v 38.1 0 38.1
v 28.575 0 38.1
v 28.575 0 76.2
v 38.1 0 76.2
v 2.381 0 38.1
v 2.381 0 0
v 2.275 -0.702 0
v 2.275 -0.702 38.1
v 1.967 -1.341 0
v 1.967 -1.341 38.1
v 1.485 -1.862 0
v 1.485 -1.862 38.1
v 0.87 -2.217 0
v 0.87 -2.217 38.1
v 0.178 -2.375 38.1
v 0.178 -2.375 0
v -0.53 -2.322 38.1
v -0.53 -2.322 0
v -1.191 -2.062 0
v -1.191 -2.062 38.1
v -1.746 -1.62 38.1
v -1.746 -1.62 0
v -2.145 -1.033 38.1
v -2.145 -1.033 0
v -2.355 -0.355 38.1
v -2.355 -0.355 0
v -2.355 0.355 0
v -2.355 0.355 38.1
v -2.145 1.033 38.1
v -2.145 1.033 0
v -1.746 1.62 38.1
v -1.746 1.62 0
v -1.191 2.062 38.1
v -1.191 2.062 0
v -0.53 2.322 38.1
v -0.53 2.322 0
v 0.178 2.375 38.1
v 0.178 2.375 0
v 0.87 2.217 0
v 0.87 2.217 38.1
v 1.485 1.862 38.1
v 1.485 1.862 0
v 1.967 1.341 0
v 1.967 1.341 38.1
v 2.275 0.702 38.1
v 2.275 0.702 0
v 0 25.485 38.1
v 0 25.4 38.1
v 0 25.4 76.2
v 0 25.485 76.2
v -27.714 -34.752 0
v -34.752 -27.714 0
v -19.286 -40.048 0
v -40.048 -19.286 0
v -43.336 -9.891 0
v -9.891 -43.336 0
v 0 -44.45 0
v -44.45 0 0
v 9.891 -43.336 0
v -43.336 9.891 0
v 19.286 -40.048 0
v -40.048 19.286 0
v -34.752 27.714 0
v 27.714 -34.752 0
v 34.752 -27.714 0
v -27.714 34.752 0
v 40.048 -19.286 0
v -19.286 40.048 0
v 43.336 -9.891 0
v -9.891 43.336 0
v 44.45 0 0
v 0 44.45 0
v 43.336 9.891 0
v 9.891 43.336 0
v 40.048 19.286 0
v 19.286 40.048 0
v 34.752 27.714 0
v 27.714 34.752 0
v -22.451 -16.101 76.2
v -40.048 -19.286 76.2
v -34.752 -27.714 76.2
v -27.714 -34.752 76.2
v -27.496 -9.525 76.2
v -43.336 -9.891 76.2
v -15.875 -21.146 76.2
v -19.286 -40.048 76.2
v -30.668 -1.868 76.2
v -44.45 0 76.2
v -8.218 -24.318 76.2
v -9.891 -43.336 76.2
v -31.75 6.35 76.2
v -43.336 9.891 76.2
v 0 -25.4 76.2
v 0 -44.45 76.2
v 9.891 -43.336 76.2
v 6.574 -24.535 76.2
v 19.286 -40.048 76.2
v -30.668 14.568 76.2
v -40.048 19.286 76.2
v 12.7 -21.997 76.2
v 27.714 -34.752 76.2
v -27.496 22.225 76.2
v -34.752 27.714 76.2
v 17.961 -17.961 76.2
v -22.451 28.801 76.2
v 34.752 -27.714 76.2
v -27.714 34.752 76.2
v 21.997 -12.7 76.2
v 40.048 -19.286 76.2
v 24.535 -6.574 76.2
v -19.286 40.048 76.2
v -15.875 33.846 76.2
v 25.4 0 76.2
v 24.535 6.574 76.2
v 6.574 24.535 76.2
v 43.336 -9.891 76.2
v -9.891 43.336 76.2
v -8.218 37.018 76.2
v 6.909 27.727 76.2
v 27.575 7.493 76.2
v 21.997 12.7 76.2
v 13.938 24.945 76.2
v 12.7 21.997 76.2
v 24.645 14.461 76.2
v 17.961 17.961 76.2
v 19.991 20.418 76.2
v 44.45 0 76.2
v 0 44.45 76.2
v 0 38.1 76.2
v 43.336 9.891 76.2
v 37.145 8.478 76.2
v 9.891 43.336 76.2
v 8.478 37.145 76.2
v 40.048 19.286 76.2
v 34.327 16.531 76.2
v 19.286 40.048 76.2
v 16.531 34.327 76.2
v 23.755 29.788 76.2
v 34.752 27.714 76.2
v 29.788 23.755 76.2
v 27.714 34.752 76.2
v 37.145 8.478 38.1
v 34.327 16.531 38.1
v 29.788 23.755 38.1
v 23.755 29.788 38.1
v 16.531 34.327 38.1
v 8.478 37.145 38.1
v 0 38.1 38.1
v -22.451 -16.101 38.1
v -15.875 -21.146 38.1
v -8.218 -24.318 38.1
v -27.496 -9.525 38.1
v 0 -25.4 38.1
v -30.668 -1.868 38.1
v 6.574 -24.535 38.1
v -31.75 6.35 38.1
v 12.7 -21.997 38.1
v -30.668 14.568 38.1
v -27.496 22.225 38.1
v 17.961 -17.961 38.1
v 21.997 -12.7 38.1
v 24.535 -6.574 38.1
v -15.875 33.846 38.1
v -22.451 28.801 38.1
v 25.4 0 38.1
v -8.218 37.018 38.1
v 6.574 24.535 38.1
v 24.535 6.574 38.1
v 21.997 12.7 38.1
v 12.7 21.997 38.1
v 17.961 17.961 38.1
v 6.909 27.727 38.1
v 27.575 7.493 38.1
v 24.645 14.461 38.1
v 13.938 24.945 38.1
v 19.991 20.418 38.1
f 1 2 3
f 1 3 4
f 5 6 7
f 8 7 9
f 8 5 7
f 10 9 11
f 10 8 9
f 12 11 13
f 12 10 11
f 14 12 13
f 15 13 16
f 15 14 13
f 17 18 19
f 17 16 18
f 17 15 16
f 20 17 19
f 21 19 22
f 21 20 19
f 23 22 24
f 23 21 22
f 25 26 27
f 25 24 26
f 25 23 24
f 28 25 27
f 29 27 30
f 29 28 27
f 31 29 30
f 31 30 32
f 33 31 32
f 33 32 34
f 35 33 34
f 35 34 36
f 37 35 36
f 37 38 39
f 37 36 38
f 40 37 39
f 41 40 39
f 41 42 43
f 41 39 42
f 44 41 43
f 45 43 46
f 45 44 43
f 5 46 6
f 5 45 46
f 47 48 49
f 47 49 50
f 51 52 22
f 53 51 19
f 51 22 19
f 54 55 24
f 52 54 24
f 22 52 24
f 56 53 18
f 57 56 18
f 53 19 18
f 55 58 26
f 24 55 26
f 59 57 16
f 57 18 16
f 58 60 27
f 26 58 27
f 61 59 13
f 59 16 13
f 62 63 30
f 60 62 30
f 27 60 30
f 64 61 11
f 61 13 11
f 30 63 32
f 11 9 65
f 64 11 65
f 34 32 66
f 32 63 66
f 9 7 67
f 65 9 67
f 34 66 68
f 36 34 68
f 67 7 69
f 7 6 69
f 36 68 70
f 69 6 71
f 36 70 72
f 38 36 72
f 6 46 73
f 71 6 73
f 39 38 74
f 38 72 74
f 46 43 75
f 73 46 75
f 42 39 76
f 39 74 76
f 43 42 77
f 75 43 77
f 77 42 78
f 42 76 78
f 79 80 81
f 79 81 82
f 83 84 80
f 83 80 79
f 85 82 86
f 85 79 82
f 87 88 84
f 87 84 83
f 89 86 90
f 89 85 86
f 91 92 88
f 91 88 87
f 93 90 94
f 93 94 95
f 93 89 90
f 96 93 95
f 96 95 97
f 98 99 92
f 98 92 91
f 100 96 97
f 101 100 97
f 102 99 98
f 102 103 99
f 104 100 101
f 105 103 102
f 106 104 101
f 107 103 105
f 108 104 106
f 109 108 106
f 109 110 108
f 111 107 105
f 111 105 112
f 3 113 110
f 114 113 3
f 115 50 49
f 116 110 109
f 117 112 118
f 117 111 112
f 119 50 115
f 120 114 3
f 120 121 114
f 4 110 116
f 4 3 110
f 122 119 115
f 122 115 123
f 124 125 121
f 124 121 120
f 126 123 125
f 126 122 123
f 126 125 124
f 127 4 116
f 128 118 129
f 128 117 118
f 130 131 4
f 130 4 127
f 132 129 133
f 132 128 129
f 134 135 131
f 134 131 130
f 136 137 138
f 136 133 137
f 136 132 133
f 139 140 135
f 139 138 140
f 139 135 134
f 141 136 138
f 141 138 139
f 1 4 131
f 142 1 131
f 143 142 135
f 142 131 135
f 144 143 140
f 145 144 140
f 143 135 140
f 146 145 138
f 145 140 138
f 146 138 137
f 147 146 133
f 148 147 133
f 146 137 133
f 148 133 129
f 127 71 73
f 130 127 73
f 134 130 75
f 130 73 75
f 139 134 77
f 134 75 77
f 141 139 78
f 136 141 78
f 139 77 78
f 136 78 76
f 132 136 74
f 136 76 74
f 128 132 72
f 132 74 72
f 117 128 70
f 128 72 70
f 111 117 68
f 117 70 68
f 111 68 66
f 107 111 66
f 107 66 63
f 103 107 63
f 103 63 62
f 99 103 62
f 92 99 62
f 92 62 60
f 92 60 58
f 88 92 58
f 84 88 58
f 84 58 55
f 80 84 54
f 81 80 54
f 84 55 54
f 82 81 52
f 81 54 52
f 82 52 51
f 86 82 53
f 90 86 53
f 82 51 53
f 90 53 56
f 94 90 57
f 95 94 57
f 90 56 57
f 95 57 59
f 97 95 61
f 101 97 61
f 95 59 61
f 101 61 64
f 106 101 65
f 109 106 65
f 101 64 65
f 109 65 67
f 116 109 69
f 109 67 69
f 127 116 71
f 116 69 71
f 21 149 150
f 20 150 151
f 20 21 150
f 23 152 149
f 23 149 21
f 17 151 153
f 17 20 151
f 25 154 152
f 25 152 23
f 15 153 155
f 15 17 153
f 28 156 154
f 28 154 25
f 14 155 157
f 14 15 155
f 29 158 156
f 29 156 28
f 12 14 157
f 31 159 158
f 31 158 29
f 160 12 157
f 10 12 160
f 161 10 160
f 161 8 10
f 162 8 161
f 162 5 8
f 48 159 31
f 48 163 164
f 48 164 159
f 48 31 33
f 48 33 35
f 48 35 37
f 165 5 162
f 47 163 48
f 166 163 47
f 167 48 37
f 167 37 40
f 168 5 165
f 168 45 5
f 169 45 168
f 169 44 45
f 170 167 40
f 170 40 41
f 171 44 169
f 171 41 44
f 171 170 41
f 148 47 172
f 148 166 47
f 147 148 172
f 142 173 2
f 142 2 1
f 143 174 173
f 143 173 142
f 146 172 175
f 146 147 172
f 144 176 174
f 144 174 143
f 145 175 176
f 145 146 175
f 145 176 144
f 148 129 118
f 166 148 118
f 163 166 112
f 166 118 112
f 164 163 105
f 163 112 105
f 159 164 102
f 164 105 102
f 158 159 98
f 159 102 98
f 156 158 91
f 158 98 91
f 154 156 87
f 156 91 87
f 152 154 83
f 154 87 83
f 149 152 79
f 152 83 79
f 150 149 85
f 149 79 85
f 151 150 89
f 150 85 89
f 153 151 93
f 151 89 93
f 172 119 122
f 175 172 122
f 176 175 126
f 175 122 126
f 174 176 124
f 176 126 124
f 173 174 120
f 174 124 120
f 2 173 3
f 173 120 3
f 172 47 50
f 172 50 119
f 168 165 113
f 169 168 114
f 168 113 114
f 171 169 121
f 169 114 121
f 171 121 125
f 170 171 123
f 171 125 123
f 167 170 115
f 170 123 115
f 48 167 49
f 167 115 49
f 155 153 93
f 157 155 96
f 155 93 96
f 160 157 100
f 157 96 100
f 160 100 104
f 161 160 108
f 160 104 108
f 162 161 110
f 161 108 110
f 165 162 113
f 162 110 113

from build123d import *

# Parameters (mm, degrees)
F0_R        = 44.45
F1_DEPTH    = 76.2
F3_DEPTH    = 38.1
F4_T1_DEPTH = 56.0791508125
F5_DEPTH    = 76.201


# Not quite as in the source:
# - a fillet or chamfer that OpenCascade refuses, or shapes differently, is made with other operations: its cross-section is extruded or revolved along the edge and cut away or added


with BuildPart() as f1:
    # F0 (on Top) → F1 (new body)
    with BuildSketch(Plane.XY):
        Circle(F0_R)
    extrude(amount=F1_DEPTH)

    # F2 (on face) → F3 (cut)
    with BuildSketch(Plane.XY.offset(76.2)):
        with BuildLine():
            Line((0, 28.575), (0, 38.1))
            ThreePointArc((0, 38.1), (-28.175329967, 20.986026826), (-25.976370723, -11.90625))
            ThreePointArc((-25.976370723, -11.90625), (-24.0494461345, 15.4322637881), (0, 28.575))
        make_face()
        with BuildLine():
            ThreePointArc((0, 28.575), (-24.0494461345, 15.4322637881), (-25.976370723, -11.90625))
            ThreePointArc((-25.976370723, -11.90625), (-14.636026826, -21.825329967), (0, -25.4))
            ThreePointArc((0, -25.4), (-25.4, 0), (0, 25.4))
            Line((0, 25.4), (0, 28.575))
        make_face()
        with BuildLine():
            ThreePointArc((0, 25.4), (-25.4, 0), (0, -25.4))
            Line((0, -25.4), (0, -2.38125))
            ThreePointArc((0, -2.38125), (-2.38125, 0), (0, 2.38125))
            Line((0, 2.38125), (0, 25.4))
        make_face()
        with BuildLine():
            Line((0, -2.38125), (0, -25.4))
            ThreePointArc((0, -25.4), (17.9605122421, -17.9605122421), (25.4, 0))
            ThreePointArc((25.4, 0), (17.9605122421, 17.9605122421), (0, 25.4))
            Line((0, 25.4), (0, 2.38125))
            ThreePointArc((0, 2.38125), (1.6837980227, 1.6837980227), (2.38125, 0))
            ThreePointArc((2.38125, 0), (1.6837980227, -1.6837980227), (0, -2.38125))
        make_face()
        with BuildLine():
            Line((28.575, 0), (38.1, 0))
            ThreePointArc((38.1, 0), (26.9407683632, 26.9407683632), (0, 38.1))
            Line((0, 38.1), (0, 28.575))
            ThreePointArc((0, 28.575), (20.2055762724, 20.2055762724), (28.575, 0))
        make_face()
    extrude(amount=-F3_DEPTH, mode=Mode.SUBTRACT)

    # F4: chamfer of 6.35 x 2.3112109876 on 1 edges, made by hand

    # F4_s2 → F4_t1 (cut)
    with BuildSketch(Plane.XY.offset(38.1)):
        with BuildLine():
            Line((0, 25.4845857979), (6.9087994087, 27.7272269751))
            ThreePointArc((6.9087994087, 27.7272269751), (3.5951834098, 28.3479325745), (0, 28.575))
            Line((0, 28.575), (0, 25.4845857979))
        make_face()
    extrude(amount=F4_T1_DEPTH, mode=Mode.SUBTRACT)

    # F5 (cut, through all): a face of the model
    f5_faces = [f1.faces().sort_by_distance(p)[0] for p in [
        (0, 0, 76.2),
    ]]
    extrude(f5_faces, amount=-F5_DEPTH, mode=Mode.SUBTRACT)


solid = f1.part
